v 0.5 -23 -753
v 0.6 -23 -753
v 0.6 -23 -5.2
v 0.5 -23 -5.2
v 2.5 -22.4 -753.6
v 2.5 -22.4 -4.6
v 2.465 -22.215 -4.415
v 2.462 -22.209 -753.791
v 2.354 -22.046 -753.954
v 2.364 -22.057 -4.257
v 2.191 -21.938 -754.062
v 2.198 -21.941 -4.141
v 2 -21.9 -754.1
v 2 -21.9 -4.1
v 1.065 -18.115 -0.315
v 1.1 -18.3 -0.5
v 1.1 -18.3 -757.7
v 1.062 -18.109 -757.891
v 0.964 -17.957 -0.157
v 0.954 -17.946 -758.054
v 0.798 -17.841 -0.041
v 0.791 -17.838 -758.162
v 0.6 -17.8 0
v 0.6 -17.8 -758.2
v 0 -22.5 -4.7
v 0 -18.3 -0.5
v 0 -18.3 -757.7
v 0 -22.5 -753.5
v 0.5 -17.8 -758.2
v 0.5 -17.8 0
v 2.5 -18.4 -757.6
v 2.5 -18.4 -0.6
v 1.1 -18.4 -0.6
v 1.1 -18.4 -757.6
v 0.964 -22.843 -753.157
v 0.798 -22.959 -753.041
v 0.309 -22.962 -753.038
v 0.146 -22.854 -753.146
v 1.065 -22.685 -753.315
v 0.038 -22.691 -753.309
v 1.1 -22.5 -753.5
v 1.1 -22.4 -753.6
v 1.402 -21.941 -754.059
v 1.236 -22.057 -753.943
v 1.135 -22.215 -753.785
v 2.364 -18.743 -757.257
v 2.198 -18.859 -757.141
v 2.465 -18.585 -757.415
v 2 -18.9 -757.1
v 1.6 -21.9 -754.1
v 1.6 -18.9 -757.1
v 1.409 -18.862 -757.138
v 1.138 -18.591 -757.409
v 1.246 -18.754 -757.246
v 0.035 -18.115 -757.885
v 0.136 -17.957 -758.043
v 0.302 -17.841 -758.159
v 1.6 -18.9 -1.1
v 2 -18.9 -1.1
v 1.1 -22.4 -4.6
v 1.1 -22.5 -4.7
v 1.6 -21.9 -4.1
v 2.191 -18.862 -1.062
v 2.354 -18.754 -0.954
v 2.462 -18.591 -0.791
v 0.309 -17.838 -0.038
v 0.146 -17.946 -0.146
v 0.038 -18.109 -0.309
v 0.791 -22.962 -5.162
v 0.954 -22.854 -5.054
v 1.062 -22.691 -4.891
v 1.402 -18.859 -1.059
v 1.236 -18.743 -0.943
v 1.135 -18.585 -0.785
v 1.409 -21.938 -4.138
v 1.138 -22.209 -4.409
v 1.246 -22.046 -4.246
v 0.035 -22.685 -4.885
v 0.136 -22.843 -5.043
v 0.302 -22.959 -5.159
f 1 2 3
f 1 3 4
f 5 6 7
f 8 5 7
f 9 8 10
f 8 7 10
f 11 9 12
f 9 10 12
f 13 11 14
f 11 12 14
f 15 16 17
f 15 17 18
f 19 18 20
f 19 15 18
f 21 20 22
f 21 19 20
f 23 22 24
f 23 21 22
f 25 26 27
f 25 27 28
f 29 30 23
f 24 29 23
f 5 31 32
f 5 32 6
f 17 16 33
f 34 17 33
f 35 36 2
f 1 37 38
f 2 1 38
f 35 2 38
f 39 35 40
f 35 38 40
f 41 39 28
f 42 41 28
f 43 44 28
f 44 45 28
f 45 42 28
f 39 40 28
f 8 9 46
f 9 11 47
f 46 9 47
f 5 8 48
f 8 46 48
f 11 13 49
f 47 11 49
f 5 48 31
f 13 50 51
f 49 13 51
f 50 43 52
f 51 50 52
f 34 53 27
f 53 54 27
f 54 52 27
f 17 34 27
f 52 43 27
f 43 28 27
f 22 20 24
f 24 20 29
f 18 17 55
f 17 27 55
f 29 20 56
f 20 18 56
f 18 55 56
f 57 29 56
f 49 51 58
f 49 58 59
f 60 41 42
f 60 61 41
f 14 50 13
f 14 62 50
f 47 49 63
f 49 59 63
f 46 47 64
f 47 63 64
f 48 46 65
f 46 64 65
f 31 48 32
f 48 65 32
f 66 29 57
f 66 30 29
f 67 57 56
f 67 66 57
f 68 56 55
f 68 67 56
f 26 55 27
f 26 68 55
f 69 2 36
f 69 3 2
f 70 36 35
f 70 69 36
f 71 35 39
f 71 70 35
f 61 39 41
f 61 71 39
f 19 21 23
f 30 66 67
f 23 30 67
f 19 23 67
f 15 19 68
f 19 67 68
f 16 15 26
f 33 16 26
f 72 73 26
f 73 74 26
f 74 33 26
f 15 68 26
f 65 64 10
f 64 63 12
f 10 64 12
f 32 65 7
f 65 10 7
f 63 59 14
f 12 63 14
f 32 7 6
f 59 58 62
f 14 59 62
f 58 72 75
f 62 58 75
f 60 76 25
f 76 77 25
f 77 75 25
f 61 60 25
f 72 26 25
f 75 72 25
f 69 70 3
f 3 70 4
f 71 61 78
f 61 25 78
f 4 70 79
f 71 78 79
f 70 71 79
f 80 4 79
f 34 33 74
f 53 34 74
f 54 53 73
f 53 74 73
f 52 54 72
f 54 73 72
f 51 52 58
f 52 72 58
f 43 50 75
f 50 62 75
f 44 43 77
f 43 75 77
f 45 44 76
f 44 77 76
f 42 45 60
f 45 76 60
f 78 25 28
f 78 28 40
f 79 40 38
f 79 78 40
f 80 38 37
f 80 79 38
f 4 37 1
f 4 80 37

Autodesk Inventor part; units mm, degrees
ref_plane "YZ Plane" through (0, 0, 0) normal (1, 0, 0) x (0, 1, 0)
ref_plane "XZ Plane" through (0, 0, 0) normal (0, 1, 0) x (-1, 0, 0)
sketch "Boceto1" plane through (0, 0, 0) normal (0, 0, 1) x (1, 0, 0)
  line L0 (0.6, -23) -> (0.5, -23)
  line L1 (0.5, -17.8) -> (0.6, -17.8)
  line L2 (1.1, -18.3) -> (1.1, -18.4)
  line L3 (1.6, -18.9) -> (2, -18.9)
  line L4 (1.1, -22.5) -> (1.1, -22.4)
  line L5 (1.6, -21.9) -> (2, -21.9)
  line L6 (0, -18.3) -> (0, -22.5)
  arc A0 (1.1, -18.4) -> (1.6, -18.9) centre (1.6, -18.4) ccw
  arc A1 (1.1, -18.3) -> (0.6, -17.8) centre (0.6, -18.3) ccw
  arc A2 (2, -18.9) -> (2.5, -18.4) centre (2, -18.4) ccw
  arc A3 (2.5, -22.4) -> (2, -21.9) centre (2, -22.4) ccw
  arc A4 (1.6, -21.9) -> (1.1, -22.4) centre (1.6, -22.4) ccw
  arc A5 (0.6, -23) -> (1.1, -22.5) centre (0.6, -22.5) ccw
  arc A6 (0, -22.5) -> (0.5, -23) centre (0.5, -22.5) ccw
  arc A7 (0.5, -17.8) -> (0, -18.3) centre (0.5, -18.3) ccw
  line L7 (2.5, -18.4) -> (2.5, -22.4)
  point P0 (0, -23)
  point P1 (0, -17.8)
  point P2 (1.1, -21.9)
  point P3 (0, -20.4)
  dimension "d112" = 5.2
  dimension "d115" = 2.6
  dimension "d116" = 2.6
  dimension "d117" = 1.5
  dimension "d118" = 1.5
  dimension "d119" = 3
  dimension "d125" = 1.1
  dimension "d132" = 0.5
  dimension "d133" = 0.5
  dimension "d141" = 0.5
extrude "Extrusión1" add sketch "Boceto1" against normal blind 758.2
ref_plane "Plano de trabajo2" through (0, 0, -379.1) normal (0, 0, 1) x (1, 0, 0)
sketch "Boceto2" plane through (0, -22.9, 1299.8) normal (-1, 0, 0) x (0, 0, 1)
  line L0 (-1299.8, -0.1) -> (-1299.8, 5.1)
  line L1 (-1299.8, -0.1) -> (-2058, -0.1) projected
  line L2 (-1299.8, -0.1) -> (-1305, -0.1)
  line L3 (-1299.8, 5.1) -> (-1305, -0.1)
  dimension "d146" = 45
extrude "Extrusión2" cut sketch "Boceto2" against normal up to surface (2.5 mm away)
mirror "Simetría1" about plane through (0, 0, -379.1) normal (0, 0, 1) of "Extrusión2"
properties part number "SP40-02 JUNTA EXT 2058" material "Caucho, negro"
